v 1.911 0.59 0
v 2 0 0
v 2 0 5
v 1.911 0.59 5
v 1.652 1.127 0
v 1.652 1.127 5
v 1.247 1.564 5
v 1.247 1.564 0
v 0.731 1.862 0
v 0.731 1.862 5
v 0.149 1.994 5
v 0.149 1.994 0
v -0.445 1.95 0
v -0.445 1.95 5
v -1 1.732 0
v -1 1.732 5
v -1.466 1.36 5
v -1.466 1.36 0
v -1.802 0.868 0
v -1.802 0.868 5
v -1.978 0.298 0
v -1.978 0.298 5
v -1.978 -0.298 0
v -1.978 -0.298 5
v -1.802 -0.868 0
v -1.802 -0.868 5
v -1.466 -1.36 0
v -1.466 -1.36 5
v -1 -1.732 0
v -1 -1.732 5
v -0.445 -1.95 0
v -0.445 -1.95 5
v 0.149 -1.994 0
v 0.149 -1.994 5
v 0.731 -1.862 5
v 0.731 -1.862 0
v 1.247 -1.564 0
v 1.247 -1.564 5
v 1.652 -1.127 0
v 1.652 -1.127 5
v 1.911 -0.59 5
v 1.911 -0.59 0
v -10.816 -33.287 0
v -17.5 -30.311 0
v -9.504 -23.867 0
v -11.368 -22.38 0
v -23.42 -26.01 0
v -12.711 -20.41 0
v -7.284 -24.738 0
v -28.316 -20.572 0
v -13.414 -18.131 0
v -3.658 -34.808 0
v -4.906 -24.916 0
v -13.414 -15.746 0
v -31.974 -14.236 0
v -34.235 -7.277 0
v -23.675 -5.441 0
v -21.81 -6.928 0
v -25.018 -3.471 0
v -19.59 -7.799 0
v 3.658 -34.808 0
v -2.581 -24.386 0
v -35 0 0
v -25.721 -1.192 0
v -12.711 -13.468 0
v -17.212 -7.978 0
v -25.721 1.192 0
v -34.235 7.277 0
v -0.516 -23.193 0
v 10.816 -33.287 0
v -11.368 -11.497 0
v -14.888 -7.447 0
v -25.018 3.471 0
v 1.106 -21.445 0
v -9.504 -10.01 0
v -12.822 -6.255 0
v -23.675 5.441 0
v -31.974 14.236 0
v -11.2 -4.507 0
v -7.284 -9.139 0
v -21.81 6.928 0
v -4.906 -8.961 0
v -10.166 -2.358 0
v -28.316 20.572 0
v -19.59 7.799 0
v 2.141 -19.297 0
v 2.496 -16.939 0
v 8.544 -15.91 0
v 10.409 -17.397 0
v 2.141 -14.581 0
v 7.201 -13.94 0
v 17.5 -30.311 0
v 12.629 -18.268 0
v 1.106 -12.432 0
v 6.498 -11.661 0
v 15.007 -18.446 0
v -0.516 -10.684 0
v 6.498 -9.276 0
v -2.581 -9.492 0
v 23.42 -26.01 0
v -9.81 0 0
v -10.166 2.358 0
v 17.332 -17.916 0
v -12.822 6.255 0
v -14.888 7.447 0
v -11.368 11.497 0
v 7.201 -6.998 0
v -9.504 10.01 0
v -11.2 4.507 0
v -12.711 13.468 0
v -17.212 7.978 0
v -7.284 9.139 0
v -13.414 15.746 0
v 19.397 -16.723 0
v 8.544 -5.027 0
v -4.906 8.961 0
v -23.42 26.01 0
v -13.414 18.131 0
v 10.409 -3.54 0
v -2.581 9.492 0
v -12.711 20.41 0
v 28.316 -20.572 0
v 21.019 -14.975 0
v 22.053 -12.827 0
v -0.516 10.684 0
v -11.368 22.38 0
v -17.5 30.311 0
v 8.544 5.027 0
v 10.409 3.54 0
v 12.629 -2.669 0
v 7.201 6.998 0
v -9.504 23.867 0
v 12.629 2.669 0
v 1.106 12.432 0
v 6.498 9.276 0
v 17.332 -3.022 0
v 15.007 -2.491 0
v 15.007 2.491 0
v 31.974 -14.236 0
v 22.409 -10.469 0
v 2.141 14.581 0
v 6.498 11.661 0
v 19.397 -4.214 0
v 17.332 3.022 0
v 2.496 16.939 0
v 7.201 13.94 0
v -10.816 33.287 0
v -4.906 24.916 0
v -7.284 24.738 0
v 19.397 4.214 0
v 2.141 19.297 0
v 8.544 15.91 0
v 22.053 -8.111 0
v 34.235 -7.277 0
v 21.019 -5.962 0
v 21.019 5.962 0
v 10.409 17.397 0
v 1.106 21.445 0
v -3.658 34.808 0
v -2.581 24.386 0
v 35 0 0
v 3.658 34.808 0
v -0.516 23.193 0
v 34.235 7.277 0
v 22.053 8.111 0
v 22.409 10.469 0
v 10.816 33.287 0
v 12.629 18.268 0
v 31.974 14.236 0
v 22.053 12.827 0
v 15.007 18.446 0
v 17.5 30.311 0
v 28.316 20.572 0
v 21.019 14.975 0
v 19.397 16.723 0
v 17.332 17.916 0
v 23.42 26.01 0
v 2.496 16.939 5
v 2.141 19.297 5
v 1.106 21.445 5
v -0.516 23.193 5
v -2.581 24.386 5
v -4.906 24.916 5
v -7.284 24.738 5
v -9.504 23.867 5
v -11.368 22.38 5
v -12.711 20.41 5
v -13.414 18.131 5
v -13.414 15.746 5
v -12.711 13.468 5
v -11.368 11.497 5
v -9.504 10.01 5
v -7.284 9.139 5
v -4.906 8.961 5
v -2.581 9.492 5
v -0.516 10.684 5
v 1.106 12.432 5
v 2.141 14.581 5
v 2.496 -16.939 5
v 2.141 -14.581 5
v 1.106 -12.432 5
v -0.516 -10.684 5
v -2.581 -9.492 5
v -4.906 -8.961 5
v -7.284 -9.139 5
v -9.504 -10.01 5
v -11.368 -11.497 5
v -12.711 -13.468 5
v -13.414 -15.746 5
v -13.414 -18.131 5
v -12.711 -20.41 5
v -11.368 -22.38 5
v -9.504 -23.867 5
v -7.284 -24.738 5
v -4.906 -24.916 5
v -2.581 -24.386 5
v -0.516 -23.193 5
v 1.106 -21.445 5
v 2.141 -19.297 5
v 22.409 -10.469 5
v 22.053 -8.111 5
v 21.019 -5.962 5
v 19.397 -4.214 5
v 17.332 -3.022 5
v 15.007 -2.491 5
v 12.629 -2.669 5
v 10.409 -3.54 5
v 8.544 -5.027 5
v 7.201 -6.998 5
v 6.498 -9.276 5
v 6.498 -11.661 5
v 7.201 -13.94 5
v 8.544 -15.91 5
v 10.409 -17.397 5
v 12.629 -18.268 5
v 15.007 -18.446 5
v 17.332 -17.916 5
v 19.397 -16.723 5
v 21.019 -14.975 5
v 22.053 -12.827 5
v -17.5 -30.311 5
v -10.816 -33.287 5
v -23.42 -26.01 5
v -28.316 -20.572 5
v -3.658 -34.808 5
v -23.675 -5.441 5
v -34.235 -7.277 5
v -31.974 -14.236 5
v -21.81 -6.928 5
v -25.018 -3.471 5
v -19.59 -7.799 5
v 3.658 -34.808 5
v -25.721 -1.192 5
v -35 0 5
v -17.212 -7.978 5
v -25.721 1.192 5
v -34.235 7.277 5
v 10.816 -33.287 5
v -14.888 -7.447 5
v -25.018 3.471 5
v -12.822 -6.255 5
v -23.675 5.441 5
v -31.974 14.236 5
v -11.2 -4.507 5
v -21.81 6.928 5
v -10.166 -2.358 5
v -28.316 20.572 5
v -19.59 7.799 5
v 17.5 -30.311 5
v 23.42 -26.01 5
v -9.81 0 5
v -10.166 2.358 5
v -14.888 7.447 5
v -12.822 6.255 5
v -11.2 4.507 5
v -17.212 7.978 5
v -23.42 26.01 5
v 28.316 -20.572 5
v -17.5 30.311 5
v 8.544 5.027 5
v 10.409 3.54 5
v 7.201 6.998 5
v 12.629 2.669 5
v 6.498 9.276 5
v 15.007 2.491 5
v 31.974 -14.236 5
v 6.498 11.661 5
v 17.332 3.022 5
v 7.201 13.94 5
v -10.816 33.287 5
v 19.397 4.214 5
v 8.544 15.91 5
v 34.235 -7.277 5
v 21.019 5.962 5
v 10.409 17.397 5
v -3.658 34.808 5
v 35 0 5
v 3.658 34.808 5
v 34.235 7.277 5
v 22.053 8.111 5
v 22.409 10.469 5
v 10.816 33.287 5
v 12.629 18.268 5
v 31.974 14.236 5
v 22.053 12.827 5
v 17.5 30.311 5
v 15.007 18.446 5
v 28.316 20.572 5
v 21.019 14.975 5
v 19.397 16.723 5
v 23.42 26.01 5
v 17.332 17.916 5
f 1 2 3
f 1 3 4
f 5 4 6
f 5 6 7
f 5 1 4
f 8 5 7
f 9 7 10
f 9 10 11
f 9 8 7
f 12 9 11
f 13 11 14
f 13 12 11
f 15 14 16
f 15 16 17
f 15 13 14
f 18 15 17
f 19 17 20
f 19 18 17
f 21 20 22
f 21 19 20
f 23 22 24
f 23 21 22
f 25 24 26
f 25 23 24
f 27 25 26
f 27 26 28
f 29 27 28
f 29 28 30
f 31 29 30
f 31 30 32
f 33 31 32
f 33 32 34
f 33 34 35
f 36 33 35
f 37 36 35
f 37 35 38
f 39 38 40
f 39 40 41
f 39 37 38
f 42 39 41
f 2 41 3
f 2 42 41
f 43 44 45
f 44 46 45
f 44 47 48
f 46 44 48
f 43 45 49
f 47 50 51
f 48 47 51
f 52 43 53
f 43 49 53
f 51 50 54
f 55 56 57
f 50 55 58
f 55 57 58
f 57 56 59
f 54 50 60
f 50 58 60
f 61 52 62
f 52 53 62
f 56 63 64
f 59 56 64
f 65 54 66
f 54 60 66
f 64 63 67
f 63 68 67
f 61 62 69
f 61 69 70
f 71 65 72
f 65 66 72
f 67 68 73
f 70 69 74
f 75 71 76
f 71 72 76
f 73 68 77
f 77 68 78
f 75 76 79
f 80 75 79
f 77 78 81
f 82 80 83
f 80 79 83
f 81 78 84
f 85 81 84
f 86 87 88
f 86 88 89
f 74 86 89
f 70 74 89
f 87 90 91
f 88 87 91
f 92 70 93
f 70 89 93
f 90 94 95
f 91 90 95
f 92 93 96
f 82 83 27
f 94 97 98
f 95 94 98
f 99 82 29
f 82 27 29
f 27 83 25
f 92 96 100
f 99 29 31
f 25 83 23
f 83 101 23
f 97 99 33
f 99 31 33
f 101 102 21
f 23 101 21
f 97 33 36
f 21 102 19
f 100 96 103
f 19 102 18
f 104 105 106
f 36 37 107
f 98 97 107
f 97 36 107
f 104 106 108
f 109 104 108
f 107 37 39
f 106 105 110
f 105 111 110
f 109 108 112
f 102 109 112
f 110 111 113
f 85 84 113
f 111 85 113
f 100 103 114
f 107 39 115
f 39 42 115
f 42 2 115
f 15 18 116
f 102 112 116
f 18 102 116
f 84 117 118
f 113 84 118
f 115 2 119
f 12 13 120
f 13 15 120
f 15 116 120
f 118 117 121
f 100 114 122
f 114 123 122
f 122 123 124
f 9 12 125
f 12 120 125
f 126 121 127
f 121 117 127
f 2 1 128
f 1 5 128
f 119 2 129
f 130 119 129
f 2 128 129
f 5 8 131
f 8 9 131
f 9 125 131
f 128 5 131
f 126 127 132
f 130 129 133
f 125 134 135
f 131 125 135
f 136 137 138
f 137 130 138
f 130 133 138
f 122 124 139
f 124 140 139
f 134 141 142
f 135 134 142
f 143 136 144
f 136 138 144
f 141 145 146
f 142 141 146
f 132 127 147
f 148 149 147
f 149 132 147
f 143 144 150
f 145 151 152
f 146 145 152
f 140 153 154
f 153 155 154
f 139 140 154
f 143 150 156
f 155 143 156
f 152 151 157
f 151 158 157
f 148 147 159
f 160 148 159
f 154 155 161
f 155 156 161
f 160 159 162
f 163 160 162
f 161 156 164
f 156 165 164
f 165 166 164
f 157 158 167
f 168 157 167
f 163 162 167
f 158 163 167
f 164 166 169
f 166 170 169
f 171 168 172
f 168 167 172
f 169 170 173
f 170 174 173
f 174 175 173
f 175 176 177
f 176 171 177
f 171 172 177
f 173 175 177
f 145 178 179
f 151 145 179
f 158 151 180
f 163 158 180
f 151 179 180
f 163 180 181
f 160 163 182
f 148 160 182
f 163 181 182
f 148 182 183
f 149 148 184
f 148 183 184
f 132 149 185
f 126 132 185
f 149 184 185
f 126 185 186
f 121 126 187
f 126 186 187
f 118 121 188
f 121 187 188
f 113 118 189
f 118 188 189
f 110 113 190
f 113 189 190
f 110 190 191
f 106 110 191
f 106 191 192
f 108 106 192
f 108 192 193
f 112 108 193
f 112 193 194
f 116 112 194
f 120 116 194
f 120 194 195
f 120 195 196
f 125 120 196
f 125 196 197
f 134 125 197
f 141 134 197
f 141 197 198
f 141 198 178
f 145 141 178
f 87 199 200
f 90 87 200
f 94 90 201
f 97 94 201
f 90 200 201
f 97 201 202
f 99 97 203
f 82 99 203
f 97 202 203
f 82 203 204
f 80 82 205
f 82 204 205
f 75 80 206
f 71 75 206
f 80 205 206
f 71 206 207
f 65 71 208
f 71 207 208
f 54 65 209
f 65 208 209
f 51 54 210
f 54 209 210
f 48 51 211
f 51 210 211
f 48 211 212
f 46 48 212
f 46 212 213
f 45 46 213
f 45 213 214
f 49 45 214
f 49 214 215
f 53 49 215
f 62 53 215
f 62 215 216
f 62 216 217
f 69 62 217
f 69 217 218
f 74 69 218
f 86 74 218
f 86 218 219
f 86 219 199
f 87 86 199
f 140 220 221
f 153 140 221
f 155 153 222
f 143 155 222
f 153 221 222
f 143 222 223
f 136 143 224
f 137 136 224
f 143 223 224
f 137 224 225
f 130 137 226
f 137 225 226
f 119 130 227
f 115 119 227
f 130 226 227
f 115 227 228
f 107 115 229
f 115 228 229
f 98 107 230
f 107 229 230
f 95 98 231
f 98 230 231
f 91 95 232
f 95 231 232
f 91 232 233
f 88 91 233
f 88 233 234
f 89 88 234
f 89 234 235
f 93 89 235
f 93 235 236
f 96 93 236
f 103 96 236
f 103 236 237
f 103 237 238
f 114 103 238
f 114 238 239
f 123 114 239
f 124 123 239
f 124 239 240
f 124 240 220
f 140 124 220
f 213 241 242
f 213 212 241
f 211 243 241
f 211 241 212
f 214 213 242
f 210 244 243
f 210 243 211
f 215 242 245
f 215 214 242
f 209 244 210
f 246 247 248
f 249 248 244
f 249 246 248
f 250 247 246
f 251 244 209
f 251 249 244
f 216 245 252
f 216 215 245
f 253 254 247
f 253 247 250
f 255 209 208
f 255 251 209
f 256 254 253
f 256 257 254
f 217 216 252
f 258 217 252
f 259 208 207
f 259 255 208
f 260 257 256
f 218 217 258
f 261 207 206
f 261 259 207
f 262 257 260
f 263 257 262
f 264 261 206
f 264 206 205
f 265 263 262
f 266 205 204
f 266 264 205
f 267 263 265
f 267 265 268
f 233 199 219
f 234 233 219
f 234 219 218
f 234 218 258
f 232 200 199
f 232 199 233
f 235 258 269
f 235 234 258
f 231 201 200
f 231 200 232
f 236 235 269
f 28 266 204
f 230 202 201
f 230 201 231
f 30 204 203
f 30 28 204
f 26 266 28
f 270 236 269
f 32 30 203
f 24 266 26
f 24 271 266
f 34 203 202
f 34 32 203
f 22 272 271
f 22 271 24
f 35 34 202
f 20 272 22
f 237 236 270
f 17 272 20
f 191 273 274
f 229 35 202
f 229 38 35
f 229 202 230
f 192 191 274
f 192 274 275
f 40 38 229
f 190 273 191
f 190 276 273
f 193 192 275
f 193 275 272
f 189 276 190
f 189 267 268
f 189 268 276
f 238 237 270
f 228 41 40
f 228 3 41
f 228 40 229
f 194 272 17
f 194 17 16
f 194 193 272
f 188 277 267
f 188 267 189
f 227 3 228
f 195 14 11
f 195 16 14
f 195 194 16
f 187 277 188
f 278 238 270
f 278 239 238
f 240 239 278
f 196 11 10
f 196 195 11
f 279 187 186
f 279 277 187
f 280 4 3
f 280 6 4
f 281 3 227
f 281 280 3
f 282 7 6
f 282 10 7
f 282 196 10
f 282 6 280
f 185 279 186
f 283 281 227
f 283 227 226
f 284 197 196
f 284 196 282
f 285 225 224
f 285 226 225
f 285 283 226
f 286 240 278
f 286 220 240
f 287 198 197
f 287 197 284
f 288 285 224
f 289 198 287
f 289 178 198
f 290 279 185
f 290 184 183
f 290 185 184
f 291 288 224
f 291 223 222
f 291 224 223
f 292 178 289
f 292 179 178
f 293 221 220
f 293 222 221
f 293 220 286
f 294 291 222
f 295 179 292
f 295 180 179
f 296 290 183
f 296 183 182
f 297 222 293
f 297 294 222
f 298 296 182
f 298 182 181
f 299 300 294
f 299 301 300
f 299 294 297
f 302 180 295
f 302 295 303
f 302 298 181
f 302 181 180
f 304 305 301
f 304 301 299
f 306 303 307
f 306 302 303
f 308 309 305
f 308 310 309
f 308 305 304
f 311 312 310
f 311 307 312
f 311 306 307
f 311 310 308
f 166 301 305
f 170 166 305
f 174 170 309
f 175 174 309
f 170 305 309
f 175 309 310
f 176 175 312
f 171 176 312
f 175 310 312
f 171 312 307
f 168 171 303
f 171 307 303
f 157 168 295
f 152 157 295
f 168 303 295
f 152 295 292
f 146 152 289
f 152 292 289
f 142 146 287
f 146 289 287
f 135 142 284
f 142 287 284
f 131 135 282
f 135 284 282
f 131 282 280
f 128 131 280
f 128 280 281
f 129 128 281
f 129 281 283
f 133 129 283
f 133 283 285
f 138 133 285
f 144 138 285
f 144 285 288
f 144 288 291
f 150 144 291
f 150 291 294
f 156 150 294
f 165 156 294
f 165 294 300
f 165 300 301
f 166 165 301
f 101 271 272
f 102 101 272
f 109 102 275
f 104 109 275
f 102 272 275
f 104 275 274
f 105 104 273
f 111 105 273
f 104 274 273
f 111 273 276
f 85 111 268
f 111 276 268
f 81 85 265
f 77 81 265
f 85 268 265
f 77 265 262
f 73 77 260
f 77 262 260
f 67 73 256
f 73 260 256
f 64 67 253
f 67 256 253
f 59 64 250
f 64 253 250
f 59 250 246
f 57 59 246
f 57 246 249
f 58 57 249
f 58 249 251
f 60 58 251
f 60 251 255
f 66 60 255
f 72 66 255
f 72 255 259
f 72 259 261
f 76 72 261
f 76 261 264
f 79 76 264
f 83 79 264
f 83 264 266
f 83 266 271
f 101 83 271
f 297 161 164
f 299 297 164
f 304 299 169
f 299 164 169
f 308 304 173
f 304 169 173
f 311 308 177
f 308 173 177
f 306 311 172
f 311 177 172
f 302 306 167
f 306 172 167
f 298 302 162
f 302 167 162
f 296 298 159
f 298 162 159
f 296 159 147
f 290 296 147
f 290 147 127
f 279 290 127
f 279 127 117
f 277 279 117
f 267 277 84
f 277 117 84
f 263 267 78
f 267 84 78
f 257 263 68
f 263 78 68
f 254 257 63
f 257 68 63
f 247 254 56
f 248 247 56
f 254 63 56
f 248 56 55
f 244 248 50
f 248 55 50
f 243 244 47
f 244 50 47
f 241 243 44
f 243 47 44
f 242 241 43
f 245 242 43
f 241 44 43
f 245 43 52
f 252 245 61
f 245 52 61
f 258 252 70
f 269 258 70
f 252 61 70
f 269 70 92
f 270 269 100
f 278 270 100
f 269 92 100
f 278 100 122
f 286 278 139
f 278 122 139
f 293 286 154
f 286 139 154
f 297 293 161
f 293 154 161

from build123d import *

# Parameters (mm, degrees)
ESQUISSE1_R             = 35
ESQUISSE1_R_2           = 2
CIRCONFERENCE_DEPTH     = 5
ESQUISSE2_R             = 8
ENL_V_MAT_EXTRU_1_DEPTH = 6


with BuildPart() as part:
    # Esquisse1 → circonference (new body)
    with BuildSketch(Plane.XY):
        Circle(ESQUISSE1_R)
        Circle(ESQUISSE1_R_2, mode=Mode.SUBTRACT)
    extrude(amount=CIRCONFERENCE_DEPTH)

    # Esquisse2 → Enlèv. mat.-Extru.1 (cut, through all)
    with BuildSketch(Plane.XY.offset(5)):
        with Locations((-17.810269486, 0)):
            Circle(ESQUISSE2_R)
        with Locations((-5.503675945, 16.938572851)):
            Circle(ESQUISSE2_R)
        with Locations((14.408810688, 10.468613743)):
            Circle(ESQUISSE2_R)
        with Locations((14.408810688, -10.468613743)):
            Circle(ESQUISSE2_R)
        with Locations((-5.503675945, -16.938572851)):
            Circle(ESQUISSE2_R)
    extrude(amount=-ENL_V_MAT_EXTRU_1_DEPTH, mode=Mode.SUBTRACT)


solid = part.part
